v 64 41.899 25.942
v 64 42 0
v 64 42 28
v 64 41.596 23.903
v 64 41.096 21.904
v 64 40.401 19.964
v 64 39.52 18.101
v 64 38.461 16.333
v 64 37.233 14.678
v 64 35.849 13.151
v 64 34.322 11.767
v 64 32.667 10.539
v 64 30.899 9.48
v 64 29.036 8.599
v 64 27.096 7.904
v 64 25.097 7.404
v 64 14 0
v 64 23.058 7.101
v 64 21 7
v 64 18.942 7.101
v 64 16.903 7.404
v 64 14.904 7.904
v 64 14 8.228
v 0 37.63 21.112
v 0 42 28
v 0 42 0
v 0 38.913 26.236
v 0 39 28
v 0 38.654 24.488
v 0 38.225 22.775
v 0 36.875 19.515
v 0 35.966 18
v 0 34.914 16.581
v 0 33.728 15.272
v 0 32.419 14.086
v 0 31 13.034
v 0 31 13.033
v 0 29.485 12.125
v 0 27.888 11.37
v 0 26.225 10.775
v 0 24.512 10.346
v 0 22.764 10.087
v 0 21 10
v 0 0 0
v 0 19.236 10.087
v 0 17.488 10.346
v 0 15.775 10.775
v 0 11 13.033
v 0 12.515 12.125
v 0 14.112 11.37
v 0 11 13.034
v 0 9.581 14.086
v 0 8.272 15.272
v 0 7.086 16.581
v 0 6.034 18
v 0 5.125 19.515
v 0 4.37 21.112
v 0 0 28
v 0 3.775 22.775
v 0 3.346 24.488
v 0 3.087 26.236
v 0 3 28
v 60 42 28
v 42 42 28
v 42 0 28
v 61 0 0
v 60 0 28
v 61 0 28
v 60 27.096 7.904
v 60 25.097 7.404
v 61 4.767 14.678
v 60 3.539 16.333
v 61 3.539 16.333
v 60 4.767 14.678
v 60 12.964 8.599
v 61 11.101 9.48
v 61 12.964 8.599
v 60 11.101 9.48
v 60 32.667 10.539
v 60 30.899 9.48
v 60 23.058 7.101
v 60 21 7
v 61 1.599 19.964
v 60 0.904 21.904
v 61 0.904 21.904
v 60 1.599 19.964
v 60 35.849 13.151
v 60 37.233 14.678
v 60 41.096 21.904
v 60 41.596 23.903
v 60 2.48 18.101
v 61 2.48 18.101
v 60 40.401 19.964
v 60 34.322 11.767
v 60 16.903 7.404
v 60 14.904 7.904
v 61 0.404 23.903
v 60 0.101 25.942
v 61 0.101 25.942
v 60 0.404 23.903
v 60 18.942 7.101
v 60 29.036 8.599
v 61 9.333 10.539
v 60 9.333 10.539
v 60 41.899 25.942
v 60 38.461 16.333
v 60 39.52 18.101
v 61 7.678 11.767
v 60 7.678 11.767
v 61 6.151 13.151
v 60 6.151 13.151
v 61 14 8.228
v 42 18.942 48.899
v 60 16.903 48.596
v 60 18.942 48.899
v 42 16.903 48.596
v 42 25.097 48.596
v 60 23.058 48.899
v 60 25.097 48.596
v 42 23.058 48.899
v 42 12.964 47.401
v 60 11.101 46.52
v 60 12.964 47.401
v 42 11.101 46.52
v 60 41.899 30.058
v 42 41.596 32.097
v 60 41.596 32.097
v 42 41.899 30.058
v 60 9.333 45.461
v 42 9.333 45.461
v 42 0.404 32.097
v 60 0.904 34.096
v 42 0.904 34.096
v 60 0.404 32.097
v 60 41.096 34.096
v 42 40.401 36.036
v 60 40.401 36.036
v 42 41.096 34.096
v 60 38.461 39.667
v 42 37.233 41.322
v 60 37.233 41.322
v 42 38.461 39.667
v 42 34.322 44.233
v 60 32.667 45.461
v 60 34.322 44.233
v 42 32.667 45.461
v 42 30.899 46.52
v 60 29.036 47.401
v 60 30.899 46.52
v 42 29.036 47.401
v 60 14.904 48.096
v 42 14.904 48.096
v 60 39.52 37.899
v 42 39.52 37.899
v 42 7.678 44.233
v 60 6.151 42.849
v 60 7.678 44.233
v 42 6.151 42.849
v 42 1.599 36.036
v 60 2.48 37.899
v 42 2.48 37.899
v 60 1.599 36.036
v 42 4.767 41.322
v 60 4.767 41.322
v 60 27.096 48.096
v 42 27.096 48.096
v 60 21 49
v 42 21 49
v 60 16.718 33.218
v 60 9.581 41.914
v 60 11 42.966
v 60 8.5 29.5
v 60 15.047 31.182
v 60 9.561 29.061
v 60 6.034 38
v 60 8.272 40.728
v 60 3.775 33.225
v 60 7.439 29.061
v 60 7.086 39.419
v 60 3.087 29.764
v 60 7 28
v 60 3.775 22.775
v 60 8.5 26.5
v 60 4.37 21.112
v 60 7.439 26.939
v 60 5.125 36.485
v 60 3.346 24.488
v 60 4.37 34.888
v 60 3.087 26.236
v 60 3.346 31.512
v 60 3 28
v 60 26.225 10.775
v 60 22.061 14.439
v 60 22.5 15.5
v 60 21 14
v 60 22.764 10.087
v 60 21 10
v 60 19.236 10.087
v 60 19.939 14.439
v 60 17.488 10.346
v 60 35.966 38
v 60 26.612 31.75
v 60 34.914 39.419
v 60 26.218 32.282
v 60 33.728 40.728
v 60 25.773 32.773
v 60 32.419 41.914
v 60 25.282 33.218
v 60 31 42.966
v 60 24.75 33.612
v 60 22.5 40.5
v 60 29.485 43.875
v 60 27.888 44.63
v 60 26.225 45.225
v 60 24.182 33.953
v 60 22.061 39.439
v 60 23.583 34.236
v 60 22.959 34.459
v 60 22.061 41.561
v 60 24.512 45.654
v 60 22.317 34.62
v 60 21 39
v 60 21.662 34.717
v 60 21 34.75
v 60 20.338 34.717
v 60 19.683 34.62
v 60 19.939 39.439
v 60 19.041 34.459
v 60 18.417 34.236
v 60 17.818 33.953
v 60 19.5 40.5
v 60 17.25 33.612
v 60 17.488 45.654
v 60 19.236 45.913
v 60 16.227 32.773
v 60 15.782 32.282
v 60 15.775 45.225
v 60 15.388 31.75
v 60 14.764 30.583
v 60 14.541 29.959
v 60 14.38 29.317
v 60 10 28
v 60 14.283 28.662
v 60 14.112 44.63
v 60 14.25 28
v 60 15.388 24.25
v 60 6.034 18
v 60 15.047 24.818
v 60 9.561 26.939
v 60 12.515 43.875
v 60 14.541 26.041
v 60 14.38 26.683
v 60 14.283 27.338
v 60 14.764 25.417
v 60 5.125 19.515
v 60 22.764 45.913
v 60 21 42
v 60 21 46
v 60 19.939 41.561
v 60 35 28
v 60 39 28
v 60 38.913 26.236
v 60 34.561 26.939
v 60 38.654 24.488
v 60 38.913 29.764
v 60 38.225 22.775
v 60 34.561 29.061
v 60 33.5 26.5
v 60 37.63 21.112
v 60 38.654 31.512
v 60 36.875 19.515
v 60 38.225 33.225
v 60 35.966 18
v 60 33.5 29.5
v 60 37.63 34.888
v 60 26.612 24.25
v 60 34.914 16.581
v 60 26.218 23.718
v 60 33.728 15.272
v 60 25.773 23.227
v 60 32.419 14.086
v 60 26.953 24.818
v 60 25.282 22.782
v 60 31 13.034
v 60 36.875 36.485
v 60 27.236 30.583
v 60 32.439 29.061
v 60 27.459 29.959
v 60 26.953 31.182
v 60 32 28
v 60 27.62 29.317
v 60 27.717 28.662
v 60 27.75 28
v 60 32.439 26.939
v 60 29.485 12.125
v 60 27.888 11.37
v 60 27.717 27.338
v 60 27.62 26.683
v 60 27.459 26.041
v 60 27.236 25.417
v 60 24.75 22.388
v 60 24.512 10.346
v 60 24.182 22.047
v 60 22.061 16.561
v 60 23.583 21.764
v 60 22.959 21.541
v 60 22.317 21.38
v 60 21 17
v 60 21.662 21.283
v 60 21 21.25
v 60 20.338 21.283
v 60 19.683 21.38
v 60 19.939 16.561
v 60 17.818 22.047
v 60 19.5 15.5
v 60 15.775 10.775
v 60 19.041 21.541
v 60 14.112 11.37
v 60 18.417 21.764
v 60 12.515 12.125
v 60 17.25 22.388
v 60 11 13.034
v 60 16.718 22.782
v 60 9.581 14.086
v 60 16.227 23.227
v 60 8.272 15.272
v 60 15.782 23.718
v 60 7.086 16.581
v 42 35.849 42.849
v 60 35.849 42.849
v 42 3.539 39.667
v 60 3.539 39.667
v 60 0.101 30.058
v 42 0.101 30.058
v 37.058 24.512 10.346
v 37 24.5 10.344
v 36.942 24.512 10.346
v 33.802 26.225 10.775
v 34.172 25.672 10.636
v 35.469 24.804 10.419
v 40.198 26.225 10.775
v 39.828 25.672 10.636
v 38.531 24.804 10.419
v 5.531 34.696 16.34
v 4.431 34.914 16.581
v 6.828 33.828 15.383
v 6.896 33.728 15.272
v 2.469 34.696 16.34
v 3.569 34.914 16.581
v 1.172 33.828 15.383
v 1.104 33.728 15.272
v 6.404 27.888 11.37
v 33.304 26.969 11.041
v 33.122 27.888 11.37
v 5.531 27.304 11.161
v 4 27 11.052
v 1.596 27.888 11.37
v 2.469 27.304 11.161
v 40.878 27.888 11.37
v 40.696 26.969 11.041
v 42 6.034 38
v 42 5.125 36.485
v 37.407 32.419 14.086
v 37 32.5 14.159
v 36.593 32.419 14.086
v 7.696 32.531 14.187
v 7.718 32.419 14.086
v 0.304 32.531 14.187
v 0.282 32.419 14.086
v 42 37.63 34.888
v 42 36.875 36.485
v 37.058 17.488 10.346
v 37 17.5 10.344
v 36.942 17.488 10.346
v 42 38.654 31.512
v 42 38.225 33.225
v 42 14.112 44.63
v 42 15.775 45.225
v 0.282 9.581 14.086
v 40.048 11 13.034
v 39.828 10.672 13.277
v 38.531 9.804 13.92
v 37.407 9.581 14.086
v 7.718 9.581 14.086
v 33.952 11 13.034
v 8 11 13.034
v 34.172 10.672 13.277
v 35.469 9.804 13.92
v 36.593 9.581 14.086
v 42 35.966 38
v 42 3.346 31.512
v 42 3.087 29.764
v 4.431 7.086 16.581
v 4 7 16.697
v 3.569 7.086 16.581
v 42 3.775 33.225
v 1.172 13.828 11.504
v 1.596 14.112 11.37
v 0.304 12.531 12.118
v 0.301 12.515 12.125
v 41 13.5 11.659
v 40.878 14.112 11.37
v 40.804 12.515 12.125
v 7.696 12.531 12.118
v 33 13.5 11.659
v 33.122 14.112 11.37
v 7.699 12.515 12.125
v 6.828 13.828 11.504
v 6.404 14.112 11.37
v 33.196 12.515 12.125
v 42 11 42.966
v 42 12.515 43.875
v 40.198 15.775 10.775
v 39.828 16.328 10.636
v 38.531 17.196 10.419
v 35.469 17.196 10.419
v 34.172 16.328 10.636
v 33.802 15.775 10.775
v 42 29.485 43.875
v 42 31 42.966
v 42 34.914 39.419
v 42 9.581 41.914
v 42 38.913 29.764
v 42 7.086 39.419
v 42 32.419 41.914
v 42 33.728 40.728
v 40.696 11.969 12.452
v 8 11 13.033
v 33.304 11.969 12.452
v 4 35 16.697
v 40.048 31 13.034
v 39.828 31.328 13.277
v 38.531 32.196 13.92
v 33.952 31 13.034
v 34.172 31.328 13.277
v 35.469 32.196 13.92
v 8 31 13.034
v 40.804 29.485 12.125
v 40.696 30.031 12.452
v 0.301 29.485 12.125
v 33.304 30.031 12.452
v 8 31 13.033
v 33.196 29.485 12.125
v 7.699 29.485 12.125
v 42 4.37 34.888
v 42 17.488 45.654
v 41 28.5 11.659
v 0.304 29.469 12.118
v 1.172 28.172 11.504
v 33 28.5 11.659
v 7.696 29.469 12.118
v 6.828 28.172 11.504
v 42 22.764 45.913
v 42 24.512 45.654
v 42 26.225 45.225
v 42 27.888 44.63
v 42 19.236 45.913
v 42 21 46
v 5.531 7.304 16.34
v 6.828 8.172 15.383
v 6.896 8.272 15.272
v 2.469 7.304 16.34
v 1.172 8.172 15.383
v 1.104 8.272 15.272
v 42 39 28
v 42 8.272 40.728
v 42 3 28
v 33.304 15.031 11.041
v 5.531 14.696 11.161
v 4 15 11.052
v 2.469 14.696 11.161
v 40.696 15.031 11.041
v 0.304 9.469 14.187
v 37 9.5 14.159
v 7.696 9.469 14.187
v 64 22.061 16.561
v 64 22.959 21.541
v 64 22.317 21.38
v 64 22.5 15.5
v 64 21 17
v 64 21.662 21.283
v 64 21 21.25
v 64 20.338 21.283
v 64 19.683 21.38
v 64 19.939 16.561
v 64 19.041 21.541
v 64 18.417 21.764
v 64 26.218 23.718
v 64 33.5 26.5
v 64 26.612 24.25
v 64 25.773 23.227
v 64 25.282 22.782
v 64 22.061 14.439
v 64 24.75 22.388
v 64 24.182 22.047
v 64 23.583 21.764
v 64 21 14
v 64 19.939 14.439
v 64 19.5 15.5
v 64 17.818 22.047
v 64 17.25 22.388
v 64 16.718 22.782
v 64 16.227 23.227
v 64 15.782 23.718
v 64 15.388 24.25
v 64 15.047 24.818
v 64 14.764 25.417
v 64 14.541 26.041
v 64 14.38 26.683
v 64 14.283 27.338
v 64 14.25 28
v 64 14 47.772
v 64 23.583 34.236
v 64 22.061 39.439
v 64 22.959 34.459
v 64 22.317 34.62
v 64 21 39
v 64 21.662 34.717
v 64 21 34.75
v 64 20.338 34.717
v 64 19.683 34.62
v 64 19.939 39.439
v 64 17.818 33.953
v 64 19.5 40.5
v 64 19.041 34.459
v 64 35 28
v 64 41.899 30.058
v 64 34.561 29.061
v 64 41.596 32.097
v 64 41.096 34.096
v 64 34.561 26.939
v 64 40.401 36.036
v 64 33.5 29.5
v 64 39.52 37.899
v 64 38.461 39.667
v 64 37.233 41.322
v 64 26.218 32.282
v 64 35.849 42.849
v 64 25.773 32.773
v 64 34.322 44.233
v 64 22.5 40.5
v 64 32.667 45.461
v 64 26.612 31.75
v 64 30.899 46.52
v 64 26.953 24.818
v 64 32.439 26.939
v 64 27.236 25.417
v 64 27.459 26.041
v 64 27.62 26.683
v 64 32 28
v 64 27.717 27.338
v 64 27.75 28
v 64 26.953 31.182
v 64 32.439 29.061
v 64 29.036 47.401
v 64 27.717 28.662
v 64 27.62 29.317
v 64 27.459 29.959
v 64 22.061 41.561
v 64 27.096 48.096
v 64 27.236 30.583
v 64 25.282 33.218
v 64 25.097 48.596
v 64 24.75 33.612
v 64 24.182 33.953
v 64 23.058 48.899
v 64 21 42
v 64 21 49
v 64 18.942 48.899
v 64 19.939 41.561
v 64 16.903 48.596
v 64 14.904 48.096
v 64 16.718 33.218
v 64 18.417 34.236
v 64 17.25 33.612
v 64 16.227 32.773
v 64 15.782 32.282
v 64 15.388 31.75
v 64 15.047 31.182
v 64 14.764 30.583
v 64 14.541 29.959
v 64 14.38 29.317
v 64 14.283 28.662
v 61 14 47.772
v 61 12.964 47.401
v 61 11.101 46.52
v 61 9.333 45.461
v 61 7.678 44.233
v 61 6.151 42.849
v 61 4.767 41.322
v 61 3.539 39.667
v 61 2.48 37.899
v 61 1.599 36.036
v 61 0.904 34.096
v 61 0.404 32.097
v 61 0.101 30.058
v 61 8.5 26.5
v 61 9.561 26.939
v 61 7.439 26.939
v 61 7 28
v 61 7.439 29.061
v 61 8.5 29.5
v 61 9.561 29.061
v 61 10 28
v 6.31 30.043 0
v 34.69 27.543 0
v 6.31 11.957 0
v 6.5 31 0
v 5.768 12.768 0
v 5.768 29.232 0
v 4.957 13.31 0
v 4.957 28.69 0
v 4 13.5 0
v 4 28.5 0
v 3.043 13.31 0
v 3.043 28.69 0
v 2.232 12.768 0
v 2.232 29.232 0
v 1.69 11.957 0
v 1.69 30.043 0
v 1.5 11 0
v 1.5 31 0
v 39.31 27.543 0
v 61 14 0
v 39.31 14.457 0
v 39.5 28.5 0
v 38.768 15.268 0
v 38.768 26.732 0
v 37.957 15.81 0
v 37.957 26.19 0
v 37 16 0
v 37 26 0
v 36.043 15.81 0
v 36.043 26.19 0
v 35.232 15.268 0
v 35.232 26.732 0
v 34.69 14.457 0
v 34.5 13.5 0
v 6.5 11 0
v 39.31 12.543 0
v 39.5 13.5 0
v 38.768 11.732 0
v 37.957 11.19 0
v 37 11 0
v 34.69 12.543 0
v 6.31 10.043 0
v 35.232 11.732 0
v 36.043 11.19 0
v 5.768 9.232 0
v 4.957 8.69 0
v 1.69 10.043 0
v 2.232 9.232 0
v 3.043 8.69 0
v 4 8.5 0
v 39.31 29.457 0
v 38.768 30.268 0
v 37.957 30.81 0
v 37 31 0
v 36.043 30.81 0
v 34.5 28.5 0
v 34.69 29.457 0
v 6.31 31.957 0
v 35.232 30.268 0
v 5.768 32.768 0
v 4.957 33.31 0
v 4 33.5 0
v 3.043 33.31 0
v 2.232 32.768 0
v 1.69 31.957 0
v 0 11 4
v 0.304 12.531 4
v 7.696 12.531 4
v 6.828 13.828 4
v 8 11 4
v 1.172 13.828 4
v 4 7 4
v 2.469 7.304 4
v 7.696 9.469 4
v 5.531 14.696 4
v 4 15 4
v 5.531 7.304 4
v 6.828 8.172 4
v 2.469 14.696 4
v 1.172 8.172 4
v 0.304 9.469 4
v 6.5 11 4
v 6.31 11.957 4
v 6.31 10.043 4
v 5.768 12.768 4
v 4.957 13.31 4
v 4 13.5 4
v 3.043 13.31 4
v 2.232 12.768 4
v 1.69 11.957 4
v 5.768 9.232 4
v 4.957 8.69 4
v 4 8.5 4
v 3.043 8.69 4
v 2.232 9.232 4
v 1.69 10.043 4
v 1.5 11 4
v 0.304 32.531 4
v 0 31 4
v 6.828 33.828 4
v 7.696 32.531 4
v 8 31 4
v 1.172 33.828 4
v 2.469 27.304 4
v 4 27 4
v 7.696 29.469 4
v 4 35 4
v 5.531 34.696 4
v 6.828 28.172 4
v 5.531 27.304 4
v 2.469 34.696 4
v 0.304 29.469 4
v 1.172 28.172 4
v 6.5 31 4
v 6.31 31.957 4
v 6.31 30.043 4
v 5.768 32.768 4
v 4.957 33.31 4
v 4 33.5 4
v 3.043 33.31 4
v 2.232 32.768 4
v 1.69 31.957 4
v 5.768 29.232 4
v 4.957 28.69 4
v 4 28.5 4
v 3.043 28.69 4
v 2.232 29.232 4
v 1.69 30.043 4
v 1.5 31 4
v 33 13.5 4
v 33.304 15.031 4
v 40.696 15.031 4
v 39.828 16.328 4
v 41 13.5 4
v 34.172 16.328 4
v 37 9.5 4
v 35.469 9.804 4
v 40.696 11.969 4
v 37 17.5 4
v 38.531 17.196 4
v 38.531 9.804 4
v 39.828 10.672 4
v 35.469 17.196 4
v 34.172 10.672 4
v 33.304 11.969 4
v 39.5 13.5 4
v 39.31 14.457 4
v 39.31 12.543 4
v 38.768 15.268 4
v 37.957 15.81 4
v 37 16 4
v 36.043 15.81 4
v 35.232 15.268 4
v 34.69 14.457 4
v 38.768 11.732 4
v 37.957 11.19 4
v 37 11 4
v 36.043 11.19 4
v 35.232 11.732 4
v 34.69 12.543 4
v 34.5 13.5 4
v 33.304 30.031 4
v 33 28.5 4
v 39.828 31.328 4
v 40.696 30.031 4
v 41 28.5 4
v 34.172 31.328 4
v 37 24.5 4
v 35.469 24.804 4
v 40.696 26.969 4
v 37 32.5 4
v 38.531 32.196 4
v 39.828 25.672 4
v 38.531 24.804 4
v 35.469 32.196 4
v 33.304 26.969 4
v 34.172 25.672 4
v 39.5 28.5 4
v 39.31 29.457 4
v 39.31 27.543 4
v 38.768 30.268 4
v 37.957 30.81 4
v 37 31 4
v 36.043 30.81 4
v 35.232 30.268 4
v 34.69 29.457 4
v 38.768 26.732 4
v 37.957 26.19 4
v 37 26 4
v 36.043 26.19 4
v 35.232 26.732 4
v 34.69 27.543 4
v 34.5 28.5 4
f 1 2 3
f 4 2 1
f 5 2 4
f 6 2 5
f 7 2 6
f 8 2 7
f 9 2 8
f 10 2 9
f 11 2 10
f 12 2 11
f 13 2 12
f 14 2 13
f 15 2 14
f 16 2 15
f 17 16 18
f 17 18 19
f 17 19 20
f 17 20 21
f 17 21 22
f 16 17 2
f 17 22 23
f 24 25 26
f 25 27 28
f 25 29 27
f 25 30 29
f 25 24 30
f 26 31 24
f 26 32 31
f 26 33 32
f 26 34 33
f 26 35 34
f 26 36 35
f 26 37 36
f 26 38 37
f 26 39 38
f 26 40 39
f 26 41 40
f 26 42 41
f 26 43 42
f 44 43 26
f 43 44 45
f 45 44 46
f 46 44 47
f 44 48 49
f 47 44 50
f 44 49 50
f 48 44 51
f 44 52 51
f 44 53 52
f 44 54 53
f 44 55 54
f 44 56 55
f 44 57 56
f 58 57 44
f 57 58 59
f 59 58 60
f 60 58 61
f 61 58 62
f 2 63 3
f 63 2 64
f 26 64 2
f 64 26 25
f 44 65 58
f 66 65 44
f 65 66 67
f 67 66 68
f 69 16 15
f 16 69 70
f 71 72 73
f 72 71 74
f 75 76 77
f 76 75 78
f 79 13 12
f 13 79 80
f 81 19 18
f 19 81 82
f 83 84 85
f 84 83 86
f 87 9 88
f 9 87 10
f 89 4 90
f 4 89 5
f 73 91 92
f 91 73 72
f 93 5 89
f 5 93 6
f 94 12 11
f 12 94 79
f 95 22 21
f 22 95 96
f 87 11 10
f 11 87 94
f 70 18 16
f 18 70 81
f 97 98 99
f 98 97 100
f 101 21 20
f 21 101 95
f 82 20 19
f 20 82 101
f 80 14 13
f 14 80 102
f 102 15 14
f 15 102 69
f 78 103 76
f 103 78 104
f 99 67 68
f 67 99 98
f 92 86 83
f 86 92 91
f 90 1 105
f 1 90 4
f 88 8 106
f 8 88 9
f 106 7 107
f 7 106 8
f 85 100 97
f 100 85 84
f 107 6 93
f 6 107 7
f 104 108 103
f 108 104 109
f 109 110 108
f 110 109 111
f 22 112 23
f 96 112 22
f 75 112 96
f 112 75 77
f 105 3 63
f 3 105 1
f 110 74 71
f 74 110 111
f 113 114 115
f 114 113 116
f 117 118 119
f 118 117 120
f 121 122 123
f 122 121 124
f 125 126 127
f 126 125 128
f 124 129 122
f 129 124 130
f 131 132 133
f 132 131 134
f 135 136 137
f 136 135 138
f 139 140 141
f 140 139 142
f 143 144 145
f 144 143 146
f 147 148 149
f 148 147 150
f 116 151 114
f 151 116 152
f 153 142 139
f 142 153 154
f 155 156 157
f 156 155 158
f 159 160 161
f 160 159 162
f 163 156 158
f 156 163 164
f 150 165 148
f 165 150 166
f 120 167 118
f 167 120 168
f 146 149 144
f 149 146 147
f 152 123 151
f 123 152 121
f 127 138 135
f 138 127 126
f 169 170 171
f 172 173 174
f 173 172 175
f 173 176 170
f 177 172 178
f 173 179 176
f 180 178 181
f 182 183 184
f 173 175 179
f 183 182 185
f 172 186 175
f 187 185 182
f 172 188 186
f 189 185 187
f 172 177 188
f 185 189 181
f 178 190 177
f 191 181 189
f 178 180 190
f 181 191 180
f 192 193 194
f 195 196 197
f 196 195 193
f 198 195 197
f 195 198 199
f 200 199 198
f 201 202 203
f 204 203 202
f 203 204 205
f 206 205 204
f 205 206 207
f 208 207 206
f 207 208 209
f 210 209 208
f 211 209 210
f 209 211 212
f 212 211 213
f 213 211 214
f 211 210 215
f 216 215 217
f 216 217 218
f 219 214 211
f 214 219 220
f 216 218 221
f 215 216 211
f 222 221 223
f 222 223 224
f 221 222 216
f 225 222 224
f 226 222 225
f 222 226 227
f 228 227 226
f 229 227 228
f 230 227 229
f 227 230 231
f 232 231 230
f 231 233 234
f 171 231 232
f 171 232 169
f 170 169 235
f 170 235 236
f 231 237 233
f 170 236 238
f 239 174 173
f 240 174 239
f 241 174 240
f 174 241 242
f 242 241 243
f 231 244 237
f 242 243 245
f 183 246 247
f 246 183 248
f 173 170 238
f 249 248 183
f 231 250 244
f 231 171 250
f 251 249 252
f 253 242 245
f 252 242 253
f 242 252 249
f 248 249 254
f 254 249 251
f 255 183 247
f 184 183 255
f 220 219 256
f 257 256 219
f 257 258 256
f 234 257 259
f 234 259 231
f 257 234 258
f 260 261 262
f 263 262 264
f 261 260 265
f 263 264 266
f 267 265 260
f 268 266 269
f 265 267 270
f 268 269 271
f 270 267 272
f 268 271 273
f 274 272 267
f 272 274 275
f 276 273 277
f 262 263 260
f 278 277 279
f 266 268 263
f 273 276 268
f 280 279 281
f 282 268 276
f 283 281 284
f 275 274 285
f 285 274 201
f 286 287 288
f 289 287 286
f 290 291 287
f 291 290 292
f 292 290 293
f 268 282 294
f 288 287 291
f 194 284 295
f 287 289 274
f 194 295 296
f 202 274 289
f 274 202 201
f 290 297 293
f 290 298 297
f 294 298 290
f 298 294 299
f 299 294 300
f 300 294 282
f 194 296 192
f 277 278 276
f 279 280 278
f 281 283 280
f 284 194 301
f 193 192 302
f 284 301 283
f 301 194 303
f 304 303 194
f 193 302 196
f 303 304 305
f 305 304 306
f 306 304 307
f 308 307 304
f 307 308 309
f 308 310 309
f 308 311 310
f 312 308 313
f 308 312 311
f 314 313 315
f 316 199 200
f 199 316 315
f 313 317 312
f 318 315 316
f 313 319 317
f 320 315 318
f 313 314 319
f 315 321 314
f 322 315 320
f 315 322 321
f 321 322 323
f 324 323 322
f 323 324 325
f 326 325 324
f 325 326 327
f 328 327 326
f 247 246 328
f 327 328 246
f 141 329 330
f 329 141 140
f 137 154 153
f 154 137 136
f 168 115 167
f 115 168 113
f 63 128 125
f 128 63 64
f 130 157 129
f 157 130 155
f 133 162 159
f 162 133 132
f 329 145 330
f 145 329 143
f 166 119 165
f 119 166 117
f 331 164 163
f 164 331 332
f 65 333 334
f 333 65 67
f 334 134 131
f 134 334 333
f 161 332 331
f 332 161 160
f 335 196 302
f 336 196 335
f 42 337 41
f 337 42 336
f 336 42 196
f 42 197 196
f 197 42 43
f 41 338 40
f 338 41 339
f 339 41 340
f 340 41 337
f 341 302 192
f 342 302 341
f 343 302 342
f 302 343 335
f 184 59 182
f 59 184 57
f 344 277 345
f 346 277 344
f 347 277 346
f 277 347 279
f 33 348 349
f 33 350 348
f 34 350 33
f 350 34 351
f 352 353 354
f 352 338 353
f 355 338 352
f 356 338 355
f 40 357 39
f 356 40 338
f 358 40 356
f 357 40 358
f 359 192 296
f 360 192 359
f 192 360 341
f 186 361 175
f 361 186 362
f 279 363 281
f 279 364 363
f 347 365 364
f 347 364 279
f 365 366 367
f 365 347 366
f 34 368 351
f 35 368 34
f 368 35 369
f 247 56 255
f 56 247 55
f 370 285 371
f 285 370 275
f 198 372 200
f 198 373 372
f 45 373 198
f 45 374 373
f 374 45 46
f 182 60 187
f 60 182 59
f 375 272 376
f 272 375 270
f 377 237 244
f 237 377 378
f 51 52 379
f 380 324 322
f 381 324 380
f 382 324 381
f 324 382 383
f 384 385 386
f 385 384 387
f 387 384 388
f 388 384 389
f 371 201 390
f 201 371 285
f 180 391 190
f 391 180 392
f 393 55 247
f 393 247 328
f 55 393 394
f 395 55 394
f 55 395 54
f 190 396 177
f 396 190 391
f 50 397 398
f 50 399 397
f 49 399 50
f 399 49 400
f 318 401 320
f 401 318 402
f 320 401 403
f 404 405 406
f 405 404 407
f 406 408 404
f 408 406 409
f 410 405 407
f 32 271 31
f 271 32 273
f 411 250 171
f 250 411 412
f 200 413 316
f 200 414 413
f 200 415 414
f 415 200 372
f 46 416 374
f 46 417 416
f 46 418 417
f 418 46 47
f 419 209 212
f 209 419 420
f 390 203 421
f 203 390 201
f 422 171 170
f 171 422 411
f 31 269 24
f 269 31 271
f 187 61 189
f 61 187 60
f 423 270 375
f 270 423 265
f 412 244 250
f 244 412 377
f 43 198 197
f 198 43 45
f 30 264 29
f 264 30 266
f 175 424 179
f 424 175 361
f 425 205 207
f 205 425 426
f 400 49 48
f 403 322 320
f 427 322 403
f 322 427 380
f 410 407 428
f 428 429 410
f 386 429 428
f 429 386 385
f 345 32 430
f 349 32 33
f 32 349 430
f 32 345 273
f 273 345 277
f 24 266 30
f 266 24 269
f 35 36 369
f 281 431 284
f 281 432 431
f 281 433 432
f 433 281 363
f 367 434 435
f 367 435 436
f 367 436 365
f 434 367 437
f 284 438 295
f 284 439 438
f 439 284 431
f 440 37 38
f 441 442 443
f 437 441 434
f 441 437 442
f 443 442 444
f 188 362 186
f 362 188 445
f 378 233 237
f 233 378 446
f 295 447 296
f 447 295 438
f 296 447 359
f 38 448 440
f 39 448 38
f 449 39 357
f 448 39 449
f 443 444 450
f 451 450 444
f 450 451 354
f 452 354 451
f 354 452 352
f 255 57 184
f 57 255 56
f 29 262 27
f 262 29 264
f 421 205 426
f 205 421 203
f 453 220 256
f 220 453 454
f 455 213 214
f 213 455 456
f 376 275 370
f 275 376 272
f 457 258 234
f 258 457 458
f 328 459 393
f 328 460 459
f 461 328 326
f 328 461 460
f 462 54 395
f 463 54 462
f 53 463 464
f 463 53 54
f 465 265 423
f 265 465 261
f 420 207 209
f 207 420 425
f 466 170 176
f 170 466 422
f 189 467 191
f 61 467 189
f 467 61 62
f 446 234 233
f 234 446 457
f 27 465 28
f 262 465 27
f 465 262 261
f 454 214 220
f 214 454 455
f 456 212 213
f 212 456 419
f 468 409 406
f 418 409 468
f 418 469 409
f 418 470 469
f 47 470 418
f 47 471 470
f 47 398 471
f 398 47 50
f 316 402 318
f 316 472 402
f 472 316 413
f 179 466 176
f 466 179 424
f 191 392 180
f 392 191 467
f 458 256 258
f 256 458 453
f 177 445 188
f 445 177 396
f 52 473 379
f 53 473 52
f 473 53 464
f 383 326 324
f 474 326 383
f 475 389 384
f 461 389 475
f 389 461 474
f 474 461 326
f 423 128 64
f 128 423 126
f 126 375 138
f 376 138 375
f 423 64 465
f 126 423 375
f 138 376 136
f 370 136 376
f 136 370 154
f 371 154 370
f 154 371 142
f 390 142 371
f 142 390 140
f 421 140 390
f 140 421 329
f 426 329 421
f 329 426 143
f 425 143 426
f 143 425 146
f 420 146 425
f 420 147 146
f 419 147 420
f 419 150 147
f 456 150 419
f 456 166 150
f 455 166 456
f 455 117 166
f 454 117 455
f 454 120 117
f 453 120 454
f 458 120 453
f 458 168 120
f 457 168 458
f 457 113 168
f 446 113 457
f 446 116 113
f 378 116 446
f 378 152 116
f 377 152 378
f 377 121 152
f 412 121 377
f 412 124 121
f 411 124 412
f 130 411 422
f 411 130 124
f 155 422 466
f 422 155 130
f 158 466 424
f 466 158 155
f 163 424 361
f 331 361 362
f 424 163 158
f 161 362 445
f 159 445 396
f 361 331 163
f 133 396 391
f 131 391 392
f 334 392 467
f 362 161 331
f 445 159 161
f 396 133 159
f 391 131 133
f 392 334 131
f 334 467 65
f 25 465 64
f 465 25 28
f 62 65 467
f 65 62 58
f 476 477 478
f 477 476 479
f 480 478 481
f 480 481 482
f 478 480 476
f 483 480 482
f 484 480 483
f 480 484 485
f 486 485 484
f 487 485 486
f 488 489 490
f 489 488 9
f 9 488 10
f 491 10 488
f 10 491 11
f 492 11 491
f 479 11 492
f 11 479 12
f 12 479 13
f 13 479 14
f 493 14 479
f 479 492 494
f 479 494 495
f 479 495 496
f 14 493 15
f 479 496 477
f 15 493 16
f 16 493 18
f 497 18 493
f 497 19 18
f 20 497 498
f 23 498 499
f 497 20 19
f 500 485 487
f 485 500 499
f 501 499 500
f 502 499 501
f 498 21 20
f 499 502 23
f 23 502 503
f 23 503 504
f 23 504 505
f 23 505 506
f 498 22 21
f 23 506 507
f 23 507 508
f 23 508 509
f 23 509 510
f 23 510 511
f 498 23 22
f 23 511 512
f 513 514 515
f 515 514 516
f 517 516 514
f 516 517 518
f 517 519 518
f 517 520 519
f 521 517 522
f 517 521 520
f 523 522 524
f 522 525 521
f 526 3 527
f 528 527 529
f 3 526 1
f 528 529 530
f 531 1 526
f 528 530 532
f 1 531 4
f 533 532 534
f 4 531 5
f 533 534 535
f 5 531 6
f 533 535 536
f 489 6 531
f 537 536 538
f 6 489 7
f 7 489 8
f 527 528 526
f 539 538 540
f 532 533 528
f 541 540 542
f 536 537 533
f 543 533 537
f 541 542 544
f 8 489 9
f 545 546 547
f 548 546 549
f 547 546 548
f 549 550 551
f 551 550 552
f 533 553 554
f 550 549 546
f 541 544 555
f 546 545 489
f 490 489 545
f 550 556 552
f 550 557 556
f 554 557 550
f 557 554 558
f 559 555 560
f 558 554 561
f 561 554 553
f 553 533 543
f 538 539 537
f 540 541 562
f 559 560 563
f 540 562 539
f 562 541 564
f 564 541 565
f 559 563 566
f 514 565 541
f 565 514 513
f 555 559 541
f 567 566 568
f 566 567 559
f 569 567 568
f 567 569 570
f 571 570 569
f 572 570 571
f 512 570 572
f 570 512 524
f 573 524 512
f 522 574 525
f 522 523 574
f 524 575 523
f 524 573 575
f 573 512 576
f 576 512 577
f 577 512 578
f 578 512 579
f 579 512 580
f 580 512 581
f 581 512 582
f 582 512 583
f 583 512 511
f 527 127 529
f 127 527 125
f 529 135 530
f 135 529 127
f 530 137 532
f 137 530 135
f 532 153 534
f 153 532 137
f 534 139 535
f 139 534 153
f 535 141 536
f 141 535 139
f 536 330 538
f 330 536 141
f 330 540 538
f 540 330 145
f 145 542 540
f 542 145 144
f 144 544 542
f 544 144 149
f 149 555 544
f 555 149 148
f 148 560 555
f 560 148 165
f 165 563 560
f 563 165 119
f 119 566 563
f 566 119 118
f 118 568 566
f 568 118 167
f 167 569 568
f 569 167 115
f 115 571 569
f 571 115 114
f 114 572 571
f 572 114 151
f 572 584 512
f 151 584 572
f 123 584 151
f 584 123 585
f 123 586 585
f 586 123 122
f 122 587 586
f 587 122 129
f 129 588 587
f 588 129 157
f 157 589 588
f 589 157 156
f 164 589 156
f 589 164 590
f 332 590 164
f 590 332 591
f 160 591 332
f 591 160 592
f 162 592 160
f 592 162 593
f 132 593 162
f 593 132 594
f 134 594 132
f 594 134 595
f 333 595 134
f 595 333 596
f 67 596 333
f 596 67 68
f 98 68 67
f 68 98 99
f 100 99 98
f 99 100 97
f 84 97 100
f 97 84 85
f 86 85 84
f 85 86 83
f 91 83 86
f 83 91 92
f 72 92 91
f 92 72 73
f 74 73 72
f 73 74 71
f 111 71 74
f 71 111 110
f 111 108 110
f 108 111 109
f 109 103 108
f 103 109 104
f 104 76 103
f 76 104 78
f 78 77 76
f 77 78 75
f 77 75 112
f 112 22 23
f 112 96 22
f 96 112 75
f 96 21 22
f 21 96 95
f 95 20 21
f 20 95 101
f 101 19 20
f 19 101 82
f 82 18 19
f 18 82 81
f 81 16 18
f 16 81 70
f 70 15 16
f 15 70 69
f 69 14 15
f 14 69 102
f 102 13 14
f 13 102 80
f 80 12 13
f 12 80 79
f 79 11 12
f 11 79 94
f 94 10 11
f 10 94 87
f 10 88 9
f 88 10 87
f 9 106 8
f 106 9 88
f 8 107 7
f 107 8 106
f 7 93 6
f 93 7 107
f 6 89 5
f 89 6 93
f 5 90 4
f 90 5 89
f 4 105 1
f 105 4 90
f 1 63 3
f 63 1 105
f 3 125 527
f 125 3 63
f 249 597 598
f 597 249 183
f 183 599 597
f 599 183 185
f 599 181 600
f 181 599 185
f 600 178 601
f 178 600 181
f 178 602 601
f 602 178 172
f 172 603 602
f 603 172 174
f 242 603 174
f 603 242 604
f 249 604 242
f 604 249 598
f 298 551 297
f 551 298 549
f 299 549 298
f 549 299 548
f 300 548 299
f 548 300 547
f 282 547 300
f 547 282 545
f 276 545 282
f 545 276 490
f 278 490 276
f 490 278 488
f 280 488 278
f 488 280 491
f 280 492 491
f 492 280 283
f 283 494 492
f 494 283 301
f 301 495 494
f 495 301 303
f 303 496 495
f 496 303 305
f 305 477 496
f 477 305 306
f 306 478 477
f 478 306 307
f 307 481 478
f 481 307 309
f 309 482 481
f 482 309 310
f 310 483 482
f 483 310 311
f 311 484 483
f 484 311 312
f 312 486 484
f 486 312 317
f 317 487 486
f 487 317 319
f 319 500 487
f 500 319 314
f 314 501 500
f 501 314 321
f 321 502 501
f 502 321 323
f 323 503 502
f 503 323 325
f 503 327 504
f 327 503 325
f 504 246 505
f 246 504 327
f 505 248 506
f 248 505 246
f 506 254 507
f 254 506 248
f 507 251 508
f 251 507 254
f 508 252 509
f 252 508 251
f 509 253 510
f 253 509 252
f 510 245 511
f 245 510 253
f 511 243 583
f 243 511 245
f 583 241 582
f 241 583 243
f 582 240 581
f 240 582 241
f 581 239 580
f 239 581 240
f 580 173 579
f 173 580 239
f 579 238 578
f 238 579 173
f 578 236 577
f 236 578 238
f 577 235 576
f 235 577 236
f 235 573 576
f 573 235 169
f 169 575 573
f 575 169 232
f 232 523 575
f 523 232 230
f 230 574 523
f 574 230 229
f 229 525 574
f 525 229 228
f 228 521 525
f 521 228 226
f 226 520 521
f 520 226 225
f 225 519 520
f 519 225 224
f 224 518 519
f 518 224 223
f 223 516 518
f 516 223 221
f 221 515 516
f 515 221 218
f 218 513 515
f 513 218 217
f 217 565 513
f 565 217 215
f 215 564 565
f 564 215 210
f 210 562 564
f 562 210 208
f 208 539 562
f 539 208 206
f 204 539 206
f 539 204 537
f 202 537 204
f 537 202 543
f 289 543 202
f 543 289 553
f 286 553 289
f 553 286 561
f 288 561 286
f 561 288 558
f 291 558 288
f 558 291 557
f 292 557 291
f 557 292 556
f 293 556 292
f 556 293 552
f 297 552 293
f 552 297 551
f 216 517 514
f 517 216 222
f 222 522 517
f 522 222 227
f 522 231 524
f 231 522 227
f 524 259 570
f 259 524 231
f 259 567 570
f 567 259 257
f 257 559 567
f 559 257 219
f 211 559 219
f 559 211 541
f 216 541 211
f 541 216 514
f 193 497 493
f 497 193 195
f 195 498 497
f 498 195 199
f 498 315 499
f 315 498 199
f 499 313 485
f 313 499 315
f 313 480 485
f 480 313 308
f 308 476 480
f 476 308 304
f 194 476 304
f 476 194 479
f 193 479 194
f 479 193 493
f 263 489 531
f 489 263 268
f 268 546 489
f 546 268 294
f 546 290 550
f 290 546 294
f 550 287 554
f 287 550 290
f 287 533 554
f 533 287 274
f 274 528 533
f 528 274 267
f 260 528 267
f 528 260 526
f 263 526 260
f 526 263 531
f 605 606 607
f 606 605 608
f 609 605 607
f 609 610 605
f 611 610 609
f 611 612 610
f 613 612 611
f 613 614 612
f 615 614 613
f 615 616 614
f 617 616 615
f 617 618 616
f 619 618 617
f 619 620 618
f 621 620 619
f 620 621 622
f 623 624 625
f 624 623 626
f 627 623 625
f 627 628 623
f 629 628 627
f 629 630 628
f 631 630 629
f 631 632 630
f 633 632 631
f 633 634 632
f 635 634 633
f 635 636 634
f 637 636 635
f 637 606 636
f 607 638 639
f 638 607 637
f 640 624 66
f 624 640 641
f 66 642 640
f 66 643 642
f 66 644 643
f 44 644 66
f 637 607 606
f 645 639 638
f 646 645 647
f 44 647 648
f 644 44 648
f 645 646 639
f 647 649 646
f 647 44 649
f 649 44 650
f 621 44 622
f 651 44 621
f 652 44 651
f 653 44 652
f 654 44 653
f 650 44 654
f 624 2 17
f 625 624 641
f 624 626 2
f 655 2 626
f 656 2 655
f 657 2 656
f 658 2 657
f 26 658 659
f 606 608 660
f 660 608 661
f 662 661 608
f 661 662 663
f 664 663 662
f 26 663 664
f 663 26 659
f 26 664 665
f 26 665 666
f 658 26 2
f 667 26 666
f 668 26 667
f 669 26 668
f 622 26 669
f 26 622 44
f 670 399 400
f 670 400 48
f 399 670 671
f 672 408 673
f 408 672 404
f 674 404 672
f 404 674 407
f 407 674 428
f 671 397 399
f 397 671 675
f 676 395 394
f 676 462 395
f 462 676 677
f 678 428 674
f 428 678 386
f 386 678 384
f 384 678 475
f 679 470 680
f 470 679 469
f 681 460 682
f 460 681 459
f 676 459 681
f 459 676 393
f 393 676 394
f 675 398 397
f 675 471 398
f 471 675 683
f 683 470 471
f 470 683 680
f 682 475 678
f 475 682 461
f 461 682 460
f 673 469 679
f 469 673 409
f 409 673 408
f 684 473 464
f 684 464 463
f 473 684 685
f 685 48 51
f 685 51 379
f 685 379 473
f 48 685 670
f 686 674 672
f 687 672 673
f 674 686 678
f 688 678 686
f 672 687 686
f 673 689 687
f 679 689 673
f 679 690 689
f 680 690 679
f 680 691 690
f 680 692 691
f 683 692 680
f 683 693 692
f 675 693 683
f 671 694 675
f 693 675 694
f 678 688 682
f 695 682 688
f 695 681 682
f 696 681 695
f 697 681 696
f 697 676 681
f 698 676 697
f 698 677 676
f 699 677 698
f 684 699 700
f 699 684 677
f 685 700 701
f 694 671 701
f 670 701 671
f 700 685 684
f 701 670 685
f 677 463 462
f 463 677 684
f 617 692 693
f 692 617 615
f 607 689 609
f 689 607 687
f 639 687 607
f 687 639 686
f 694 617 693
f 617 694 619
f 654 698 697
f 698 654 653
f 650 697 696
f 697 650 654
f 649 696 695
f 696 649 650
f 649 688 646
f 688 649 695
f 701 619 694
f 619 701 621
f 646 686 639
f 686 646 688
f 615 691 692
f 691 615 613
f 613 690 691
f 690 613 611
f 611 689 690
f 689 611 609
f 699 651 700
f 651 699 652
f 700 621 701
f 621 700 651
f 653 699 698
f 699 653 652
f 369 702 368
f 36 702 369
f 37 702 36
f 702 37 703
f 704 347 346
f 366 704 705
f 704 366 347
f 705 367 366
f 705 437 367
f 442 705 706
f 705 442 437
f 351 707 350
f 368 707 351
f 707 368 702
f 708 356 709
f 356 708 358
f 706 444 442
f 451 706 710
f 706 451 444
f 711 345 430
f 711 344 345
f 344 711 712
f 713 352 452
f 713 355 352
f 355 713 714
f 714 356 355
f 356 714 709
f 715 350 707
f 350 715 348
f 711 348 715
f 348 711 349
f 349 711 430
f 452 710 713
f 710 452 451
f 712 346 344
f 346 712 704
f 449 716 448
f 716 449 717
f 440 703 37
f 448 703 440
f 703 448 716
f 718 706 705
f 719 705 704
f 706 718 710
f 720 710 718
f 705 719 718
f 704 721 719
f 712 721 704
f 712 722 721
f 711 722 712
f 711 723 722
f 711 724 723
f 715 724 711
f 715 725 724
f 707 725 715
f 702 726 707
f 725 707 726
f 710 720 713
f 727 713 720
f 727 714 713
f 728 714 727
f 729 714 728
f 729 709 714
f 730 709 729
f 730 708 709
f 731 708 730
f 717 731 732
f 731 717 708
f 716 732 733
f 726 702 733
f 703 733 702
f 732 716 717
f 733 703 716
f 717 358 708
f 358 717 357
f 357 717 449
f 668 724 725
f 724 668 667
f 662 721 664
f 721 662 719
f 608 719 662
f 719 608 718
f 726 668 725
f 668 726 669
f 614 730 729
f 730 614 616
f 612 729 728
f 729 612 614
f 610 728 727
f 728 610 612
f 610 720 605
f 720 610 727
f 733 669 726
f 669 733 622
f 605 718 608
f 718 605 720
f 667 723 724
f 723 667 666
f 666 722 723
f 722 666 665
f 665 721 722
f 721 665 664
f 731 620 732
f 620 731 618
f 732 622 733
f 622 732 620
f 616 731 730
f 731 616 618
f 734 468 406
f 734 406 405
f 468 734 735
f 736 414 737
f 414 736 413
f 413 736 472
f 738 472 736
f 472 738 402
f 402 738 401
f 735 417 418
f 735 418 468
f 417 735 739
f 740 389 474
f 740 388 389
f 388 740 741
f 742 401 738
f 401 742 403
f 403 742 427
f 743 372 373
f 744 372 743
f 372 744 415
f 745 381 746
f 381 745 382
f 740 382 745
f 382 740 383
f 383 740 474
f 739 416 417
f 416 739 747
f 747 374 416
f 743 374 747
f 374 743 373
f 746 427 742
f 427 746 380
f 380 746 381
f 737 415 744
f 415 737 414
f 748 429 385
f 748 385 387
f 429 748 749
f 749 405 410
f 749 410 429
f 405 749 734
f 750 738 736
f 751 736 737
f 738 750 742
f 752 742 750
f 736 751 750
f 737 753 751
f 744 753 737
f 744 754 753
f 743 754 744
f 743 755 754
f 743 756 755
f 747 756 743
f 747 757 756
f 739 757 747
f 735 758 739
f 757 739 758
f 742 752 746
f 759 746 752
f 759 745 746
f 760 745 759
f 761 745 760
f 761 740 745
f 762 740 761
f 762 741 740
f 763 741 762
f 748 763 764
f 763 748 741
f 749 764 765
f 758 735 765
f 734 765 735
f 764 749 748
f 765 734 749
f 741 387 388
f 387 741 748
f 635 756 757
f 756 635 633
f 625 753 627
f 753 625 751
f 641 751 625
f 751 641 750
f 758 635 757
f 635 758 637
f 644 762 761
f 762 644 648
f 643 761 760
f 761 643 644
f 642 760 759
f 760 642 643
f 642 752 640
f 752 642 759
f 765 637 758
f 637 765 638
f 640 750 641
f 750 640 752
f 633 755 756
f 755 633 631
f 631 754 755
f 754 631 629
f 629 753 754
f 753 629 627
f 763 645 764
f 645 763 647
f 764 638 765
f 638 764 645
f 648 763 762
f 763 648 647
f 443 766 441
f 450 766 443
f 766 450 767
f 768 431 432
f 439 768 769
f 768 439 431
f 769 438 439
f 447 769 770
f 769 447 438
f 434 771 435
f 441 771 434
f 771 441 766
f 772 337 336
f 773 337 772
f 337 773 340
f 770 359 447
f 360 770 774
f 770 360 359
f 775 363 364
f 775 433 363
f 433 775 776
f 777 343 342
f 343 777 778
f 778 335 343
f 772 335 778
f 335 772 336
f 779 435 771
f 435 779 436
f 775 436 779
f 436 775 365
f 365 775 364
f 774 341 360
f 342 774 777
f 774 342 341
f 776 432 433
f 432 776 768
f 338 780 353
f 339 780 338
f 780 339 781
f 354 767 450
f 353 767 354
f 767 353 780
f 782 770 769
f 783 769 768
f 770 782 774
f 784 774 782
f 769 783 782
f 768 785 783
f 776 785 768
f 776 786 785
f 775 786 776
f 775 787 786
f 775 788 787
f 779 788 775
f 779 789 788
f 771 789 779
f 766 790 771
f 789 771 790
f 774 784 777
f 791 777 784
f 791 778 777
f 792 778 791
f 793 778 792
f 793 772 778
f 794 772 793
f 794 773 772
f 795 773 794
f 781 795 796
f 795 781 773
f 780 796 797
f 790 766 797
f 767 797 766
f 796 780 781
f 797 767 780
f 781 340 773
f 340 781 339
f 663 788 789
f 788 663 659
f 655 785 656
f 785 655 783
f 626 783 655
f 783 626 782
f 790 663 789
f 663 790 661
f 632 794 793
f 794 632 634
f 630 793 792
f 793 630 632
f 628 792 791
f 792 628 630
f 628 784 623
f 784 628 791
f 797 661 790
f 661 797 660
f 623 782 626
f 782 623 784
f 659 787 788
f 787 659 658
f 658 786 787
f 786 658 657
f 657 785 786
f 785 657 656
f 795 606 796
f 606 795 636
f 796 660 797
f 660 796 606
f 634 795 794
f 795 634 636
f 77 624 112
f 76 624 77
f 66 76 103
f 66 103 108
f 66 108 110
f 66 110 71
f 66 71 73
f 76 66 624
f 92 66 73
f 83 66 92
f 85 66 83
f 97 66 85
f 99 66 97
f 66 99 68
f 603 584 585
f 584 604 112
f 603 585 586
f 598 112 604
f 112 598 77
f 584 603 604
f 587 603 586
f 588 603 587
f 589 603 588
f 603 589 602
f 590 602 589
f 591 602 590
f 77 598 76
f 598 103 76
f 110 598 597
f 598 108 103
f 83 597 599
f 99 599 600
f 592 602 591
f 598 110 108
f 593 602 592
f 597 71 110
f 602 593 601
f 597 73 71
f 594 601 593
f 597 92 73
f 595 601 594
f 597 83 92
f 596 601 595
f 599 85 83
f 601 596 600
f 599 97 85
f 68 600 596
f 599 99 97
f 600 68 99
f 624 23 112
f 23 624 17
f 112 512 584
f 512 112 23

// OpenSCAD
fn=64;
$fn=fn;


motor_d=36;
motor_l=60;


plate_screw_d   = 3;
plate_screw_off = 25/2;
plate_gear_hole_d = 13.5;
plate_gear_hole_l = 16;

bottom_screw_1_gap_y = 20;
bottom_screw_2_gap_y = 15;
bottom_screw_1_gap_x = 4;
bottom_screw_2_gap_x = 37;

plate_h=4;

bottom_t = 7;
front_t = 3;

motor_case_d = motor_d+front_t*2;

motor_plate_y=14;
motor_plate_x_off=1;

difference(){
  translate([0,0,bottom_t])
  union(){
    translate([motor_l,motor_case_d/2,motor_case_d/2])
    rotate([0,90,0])
    plate(plate_h=plate_h);



    difference(){
      motor_case();

      translate([0,front_t,front_t])
      motor();


      translate([0,0,motor_case_d/2]) 
      cube([motor_l-18, motor_case_d,motor_case_d/2]);
    }
    translate([0,0,-bottom_t]) 
  cube([motor_l+plate_h,motor_case_d,bottom_t]);
  }
  translate([motor_l+motor_plate_x_off,0,0]) 
  #cube([plate_h,motor_plate_y,motor_case_d+bottom_t]);
  #translate([0,front_t,4])
  bottom_screws();
}

module motor_case(){
  translate([0,motor_case_d/2,motor_case_d/2])
  rotate([0,90,0])
  cylinder(d=motor_case_d,h=motor_l);
  difference(){
    cube([motor_l+plate_h,motor_case_d,motor_case_d/2]);
    translate([0,motor_case_d/2,motor_case_d/2]) 
    rotate([0,90,0])
    cylinder(d=motor_case_d,h=motor_l+plate_h);
  }
}

module bottom_screws(){
  translate([bottom_screw_1_gap_x,(motor_d-bottom_screw_1_gap_y)/2,0])
  {
    screw();
    translate([0,bottom_screw_1_gap_y,0])
    screw();
  }

  translate([bottom_screw_2_gap_x,(motor_d-bottom_screw_2_gap_y)/2,0])
  {
    screw();
    translate([0,bottom_screw_2_gap_y,0])
    screw();
  }
}


module screw(d1=8,d2=5, l2=20, l1=50){
  cylinder(d=d1,h=l1,$fn=fn/4);
  translate([0,0,-l2])
  cylinder(d=d2,h=l2,$fn=fn/4);
}

module motor(){
  translate([0,motor_d/2,motor_d/2])
  rotate([0,90,0])
  union(){
    // translate([0,0,plate_gear_hole_l])
    cylinder(d=motor_d,h=motor_l);
    cylinder(d=plate_gear_hole_d,h=motor_l+plate_gear_hole_l);
  }
}

module plate(plate_h=1.5){


  // translate([-29,0,18.5])
  rotate([0,0,180])

  difference(){
    linear_extrude(height = plate_h) 
    difference(){
      circle(d=motor_case_d);
      circle(d=plate_gear_hole_d);

      // START SCREW HOLES
      translate([plate_screw_off,0,0])
      circle(d=plate_screw_d,$fn=fn/8);

      translate([-plate_screw_off,0,0])
      circle(d=plate_screw_d,$fn=fn/8);

      translate([0,plate_screw_off,0])
      circle(d=plate_screw_d,$fn=fn/8);

      translate([0,-plate_screw_off,0])
      circle(d=plate_screw_d,$fn=fn/8);
      // END SCREW HOLES
    }
  }
}
